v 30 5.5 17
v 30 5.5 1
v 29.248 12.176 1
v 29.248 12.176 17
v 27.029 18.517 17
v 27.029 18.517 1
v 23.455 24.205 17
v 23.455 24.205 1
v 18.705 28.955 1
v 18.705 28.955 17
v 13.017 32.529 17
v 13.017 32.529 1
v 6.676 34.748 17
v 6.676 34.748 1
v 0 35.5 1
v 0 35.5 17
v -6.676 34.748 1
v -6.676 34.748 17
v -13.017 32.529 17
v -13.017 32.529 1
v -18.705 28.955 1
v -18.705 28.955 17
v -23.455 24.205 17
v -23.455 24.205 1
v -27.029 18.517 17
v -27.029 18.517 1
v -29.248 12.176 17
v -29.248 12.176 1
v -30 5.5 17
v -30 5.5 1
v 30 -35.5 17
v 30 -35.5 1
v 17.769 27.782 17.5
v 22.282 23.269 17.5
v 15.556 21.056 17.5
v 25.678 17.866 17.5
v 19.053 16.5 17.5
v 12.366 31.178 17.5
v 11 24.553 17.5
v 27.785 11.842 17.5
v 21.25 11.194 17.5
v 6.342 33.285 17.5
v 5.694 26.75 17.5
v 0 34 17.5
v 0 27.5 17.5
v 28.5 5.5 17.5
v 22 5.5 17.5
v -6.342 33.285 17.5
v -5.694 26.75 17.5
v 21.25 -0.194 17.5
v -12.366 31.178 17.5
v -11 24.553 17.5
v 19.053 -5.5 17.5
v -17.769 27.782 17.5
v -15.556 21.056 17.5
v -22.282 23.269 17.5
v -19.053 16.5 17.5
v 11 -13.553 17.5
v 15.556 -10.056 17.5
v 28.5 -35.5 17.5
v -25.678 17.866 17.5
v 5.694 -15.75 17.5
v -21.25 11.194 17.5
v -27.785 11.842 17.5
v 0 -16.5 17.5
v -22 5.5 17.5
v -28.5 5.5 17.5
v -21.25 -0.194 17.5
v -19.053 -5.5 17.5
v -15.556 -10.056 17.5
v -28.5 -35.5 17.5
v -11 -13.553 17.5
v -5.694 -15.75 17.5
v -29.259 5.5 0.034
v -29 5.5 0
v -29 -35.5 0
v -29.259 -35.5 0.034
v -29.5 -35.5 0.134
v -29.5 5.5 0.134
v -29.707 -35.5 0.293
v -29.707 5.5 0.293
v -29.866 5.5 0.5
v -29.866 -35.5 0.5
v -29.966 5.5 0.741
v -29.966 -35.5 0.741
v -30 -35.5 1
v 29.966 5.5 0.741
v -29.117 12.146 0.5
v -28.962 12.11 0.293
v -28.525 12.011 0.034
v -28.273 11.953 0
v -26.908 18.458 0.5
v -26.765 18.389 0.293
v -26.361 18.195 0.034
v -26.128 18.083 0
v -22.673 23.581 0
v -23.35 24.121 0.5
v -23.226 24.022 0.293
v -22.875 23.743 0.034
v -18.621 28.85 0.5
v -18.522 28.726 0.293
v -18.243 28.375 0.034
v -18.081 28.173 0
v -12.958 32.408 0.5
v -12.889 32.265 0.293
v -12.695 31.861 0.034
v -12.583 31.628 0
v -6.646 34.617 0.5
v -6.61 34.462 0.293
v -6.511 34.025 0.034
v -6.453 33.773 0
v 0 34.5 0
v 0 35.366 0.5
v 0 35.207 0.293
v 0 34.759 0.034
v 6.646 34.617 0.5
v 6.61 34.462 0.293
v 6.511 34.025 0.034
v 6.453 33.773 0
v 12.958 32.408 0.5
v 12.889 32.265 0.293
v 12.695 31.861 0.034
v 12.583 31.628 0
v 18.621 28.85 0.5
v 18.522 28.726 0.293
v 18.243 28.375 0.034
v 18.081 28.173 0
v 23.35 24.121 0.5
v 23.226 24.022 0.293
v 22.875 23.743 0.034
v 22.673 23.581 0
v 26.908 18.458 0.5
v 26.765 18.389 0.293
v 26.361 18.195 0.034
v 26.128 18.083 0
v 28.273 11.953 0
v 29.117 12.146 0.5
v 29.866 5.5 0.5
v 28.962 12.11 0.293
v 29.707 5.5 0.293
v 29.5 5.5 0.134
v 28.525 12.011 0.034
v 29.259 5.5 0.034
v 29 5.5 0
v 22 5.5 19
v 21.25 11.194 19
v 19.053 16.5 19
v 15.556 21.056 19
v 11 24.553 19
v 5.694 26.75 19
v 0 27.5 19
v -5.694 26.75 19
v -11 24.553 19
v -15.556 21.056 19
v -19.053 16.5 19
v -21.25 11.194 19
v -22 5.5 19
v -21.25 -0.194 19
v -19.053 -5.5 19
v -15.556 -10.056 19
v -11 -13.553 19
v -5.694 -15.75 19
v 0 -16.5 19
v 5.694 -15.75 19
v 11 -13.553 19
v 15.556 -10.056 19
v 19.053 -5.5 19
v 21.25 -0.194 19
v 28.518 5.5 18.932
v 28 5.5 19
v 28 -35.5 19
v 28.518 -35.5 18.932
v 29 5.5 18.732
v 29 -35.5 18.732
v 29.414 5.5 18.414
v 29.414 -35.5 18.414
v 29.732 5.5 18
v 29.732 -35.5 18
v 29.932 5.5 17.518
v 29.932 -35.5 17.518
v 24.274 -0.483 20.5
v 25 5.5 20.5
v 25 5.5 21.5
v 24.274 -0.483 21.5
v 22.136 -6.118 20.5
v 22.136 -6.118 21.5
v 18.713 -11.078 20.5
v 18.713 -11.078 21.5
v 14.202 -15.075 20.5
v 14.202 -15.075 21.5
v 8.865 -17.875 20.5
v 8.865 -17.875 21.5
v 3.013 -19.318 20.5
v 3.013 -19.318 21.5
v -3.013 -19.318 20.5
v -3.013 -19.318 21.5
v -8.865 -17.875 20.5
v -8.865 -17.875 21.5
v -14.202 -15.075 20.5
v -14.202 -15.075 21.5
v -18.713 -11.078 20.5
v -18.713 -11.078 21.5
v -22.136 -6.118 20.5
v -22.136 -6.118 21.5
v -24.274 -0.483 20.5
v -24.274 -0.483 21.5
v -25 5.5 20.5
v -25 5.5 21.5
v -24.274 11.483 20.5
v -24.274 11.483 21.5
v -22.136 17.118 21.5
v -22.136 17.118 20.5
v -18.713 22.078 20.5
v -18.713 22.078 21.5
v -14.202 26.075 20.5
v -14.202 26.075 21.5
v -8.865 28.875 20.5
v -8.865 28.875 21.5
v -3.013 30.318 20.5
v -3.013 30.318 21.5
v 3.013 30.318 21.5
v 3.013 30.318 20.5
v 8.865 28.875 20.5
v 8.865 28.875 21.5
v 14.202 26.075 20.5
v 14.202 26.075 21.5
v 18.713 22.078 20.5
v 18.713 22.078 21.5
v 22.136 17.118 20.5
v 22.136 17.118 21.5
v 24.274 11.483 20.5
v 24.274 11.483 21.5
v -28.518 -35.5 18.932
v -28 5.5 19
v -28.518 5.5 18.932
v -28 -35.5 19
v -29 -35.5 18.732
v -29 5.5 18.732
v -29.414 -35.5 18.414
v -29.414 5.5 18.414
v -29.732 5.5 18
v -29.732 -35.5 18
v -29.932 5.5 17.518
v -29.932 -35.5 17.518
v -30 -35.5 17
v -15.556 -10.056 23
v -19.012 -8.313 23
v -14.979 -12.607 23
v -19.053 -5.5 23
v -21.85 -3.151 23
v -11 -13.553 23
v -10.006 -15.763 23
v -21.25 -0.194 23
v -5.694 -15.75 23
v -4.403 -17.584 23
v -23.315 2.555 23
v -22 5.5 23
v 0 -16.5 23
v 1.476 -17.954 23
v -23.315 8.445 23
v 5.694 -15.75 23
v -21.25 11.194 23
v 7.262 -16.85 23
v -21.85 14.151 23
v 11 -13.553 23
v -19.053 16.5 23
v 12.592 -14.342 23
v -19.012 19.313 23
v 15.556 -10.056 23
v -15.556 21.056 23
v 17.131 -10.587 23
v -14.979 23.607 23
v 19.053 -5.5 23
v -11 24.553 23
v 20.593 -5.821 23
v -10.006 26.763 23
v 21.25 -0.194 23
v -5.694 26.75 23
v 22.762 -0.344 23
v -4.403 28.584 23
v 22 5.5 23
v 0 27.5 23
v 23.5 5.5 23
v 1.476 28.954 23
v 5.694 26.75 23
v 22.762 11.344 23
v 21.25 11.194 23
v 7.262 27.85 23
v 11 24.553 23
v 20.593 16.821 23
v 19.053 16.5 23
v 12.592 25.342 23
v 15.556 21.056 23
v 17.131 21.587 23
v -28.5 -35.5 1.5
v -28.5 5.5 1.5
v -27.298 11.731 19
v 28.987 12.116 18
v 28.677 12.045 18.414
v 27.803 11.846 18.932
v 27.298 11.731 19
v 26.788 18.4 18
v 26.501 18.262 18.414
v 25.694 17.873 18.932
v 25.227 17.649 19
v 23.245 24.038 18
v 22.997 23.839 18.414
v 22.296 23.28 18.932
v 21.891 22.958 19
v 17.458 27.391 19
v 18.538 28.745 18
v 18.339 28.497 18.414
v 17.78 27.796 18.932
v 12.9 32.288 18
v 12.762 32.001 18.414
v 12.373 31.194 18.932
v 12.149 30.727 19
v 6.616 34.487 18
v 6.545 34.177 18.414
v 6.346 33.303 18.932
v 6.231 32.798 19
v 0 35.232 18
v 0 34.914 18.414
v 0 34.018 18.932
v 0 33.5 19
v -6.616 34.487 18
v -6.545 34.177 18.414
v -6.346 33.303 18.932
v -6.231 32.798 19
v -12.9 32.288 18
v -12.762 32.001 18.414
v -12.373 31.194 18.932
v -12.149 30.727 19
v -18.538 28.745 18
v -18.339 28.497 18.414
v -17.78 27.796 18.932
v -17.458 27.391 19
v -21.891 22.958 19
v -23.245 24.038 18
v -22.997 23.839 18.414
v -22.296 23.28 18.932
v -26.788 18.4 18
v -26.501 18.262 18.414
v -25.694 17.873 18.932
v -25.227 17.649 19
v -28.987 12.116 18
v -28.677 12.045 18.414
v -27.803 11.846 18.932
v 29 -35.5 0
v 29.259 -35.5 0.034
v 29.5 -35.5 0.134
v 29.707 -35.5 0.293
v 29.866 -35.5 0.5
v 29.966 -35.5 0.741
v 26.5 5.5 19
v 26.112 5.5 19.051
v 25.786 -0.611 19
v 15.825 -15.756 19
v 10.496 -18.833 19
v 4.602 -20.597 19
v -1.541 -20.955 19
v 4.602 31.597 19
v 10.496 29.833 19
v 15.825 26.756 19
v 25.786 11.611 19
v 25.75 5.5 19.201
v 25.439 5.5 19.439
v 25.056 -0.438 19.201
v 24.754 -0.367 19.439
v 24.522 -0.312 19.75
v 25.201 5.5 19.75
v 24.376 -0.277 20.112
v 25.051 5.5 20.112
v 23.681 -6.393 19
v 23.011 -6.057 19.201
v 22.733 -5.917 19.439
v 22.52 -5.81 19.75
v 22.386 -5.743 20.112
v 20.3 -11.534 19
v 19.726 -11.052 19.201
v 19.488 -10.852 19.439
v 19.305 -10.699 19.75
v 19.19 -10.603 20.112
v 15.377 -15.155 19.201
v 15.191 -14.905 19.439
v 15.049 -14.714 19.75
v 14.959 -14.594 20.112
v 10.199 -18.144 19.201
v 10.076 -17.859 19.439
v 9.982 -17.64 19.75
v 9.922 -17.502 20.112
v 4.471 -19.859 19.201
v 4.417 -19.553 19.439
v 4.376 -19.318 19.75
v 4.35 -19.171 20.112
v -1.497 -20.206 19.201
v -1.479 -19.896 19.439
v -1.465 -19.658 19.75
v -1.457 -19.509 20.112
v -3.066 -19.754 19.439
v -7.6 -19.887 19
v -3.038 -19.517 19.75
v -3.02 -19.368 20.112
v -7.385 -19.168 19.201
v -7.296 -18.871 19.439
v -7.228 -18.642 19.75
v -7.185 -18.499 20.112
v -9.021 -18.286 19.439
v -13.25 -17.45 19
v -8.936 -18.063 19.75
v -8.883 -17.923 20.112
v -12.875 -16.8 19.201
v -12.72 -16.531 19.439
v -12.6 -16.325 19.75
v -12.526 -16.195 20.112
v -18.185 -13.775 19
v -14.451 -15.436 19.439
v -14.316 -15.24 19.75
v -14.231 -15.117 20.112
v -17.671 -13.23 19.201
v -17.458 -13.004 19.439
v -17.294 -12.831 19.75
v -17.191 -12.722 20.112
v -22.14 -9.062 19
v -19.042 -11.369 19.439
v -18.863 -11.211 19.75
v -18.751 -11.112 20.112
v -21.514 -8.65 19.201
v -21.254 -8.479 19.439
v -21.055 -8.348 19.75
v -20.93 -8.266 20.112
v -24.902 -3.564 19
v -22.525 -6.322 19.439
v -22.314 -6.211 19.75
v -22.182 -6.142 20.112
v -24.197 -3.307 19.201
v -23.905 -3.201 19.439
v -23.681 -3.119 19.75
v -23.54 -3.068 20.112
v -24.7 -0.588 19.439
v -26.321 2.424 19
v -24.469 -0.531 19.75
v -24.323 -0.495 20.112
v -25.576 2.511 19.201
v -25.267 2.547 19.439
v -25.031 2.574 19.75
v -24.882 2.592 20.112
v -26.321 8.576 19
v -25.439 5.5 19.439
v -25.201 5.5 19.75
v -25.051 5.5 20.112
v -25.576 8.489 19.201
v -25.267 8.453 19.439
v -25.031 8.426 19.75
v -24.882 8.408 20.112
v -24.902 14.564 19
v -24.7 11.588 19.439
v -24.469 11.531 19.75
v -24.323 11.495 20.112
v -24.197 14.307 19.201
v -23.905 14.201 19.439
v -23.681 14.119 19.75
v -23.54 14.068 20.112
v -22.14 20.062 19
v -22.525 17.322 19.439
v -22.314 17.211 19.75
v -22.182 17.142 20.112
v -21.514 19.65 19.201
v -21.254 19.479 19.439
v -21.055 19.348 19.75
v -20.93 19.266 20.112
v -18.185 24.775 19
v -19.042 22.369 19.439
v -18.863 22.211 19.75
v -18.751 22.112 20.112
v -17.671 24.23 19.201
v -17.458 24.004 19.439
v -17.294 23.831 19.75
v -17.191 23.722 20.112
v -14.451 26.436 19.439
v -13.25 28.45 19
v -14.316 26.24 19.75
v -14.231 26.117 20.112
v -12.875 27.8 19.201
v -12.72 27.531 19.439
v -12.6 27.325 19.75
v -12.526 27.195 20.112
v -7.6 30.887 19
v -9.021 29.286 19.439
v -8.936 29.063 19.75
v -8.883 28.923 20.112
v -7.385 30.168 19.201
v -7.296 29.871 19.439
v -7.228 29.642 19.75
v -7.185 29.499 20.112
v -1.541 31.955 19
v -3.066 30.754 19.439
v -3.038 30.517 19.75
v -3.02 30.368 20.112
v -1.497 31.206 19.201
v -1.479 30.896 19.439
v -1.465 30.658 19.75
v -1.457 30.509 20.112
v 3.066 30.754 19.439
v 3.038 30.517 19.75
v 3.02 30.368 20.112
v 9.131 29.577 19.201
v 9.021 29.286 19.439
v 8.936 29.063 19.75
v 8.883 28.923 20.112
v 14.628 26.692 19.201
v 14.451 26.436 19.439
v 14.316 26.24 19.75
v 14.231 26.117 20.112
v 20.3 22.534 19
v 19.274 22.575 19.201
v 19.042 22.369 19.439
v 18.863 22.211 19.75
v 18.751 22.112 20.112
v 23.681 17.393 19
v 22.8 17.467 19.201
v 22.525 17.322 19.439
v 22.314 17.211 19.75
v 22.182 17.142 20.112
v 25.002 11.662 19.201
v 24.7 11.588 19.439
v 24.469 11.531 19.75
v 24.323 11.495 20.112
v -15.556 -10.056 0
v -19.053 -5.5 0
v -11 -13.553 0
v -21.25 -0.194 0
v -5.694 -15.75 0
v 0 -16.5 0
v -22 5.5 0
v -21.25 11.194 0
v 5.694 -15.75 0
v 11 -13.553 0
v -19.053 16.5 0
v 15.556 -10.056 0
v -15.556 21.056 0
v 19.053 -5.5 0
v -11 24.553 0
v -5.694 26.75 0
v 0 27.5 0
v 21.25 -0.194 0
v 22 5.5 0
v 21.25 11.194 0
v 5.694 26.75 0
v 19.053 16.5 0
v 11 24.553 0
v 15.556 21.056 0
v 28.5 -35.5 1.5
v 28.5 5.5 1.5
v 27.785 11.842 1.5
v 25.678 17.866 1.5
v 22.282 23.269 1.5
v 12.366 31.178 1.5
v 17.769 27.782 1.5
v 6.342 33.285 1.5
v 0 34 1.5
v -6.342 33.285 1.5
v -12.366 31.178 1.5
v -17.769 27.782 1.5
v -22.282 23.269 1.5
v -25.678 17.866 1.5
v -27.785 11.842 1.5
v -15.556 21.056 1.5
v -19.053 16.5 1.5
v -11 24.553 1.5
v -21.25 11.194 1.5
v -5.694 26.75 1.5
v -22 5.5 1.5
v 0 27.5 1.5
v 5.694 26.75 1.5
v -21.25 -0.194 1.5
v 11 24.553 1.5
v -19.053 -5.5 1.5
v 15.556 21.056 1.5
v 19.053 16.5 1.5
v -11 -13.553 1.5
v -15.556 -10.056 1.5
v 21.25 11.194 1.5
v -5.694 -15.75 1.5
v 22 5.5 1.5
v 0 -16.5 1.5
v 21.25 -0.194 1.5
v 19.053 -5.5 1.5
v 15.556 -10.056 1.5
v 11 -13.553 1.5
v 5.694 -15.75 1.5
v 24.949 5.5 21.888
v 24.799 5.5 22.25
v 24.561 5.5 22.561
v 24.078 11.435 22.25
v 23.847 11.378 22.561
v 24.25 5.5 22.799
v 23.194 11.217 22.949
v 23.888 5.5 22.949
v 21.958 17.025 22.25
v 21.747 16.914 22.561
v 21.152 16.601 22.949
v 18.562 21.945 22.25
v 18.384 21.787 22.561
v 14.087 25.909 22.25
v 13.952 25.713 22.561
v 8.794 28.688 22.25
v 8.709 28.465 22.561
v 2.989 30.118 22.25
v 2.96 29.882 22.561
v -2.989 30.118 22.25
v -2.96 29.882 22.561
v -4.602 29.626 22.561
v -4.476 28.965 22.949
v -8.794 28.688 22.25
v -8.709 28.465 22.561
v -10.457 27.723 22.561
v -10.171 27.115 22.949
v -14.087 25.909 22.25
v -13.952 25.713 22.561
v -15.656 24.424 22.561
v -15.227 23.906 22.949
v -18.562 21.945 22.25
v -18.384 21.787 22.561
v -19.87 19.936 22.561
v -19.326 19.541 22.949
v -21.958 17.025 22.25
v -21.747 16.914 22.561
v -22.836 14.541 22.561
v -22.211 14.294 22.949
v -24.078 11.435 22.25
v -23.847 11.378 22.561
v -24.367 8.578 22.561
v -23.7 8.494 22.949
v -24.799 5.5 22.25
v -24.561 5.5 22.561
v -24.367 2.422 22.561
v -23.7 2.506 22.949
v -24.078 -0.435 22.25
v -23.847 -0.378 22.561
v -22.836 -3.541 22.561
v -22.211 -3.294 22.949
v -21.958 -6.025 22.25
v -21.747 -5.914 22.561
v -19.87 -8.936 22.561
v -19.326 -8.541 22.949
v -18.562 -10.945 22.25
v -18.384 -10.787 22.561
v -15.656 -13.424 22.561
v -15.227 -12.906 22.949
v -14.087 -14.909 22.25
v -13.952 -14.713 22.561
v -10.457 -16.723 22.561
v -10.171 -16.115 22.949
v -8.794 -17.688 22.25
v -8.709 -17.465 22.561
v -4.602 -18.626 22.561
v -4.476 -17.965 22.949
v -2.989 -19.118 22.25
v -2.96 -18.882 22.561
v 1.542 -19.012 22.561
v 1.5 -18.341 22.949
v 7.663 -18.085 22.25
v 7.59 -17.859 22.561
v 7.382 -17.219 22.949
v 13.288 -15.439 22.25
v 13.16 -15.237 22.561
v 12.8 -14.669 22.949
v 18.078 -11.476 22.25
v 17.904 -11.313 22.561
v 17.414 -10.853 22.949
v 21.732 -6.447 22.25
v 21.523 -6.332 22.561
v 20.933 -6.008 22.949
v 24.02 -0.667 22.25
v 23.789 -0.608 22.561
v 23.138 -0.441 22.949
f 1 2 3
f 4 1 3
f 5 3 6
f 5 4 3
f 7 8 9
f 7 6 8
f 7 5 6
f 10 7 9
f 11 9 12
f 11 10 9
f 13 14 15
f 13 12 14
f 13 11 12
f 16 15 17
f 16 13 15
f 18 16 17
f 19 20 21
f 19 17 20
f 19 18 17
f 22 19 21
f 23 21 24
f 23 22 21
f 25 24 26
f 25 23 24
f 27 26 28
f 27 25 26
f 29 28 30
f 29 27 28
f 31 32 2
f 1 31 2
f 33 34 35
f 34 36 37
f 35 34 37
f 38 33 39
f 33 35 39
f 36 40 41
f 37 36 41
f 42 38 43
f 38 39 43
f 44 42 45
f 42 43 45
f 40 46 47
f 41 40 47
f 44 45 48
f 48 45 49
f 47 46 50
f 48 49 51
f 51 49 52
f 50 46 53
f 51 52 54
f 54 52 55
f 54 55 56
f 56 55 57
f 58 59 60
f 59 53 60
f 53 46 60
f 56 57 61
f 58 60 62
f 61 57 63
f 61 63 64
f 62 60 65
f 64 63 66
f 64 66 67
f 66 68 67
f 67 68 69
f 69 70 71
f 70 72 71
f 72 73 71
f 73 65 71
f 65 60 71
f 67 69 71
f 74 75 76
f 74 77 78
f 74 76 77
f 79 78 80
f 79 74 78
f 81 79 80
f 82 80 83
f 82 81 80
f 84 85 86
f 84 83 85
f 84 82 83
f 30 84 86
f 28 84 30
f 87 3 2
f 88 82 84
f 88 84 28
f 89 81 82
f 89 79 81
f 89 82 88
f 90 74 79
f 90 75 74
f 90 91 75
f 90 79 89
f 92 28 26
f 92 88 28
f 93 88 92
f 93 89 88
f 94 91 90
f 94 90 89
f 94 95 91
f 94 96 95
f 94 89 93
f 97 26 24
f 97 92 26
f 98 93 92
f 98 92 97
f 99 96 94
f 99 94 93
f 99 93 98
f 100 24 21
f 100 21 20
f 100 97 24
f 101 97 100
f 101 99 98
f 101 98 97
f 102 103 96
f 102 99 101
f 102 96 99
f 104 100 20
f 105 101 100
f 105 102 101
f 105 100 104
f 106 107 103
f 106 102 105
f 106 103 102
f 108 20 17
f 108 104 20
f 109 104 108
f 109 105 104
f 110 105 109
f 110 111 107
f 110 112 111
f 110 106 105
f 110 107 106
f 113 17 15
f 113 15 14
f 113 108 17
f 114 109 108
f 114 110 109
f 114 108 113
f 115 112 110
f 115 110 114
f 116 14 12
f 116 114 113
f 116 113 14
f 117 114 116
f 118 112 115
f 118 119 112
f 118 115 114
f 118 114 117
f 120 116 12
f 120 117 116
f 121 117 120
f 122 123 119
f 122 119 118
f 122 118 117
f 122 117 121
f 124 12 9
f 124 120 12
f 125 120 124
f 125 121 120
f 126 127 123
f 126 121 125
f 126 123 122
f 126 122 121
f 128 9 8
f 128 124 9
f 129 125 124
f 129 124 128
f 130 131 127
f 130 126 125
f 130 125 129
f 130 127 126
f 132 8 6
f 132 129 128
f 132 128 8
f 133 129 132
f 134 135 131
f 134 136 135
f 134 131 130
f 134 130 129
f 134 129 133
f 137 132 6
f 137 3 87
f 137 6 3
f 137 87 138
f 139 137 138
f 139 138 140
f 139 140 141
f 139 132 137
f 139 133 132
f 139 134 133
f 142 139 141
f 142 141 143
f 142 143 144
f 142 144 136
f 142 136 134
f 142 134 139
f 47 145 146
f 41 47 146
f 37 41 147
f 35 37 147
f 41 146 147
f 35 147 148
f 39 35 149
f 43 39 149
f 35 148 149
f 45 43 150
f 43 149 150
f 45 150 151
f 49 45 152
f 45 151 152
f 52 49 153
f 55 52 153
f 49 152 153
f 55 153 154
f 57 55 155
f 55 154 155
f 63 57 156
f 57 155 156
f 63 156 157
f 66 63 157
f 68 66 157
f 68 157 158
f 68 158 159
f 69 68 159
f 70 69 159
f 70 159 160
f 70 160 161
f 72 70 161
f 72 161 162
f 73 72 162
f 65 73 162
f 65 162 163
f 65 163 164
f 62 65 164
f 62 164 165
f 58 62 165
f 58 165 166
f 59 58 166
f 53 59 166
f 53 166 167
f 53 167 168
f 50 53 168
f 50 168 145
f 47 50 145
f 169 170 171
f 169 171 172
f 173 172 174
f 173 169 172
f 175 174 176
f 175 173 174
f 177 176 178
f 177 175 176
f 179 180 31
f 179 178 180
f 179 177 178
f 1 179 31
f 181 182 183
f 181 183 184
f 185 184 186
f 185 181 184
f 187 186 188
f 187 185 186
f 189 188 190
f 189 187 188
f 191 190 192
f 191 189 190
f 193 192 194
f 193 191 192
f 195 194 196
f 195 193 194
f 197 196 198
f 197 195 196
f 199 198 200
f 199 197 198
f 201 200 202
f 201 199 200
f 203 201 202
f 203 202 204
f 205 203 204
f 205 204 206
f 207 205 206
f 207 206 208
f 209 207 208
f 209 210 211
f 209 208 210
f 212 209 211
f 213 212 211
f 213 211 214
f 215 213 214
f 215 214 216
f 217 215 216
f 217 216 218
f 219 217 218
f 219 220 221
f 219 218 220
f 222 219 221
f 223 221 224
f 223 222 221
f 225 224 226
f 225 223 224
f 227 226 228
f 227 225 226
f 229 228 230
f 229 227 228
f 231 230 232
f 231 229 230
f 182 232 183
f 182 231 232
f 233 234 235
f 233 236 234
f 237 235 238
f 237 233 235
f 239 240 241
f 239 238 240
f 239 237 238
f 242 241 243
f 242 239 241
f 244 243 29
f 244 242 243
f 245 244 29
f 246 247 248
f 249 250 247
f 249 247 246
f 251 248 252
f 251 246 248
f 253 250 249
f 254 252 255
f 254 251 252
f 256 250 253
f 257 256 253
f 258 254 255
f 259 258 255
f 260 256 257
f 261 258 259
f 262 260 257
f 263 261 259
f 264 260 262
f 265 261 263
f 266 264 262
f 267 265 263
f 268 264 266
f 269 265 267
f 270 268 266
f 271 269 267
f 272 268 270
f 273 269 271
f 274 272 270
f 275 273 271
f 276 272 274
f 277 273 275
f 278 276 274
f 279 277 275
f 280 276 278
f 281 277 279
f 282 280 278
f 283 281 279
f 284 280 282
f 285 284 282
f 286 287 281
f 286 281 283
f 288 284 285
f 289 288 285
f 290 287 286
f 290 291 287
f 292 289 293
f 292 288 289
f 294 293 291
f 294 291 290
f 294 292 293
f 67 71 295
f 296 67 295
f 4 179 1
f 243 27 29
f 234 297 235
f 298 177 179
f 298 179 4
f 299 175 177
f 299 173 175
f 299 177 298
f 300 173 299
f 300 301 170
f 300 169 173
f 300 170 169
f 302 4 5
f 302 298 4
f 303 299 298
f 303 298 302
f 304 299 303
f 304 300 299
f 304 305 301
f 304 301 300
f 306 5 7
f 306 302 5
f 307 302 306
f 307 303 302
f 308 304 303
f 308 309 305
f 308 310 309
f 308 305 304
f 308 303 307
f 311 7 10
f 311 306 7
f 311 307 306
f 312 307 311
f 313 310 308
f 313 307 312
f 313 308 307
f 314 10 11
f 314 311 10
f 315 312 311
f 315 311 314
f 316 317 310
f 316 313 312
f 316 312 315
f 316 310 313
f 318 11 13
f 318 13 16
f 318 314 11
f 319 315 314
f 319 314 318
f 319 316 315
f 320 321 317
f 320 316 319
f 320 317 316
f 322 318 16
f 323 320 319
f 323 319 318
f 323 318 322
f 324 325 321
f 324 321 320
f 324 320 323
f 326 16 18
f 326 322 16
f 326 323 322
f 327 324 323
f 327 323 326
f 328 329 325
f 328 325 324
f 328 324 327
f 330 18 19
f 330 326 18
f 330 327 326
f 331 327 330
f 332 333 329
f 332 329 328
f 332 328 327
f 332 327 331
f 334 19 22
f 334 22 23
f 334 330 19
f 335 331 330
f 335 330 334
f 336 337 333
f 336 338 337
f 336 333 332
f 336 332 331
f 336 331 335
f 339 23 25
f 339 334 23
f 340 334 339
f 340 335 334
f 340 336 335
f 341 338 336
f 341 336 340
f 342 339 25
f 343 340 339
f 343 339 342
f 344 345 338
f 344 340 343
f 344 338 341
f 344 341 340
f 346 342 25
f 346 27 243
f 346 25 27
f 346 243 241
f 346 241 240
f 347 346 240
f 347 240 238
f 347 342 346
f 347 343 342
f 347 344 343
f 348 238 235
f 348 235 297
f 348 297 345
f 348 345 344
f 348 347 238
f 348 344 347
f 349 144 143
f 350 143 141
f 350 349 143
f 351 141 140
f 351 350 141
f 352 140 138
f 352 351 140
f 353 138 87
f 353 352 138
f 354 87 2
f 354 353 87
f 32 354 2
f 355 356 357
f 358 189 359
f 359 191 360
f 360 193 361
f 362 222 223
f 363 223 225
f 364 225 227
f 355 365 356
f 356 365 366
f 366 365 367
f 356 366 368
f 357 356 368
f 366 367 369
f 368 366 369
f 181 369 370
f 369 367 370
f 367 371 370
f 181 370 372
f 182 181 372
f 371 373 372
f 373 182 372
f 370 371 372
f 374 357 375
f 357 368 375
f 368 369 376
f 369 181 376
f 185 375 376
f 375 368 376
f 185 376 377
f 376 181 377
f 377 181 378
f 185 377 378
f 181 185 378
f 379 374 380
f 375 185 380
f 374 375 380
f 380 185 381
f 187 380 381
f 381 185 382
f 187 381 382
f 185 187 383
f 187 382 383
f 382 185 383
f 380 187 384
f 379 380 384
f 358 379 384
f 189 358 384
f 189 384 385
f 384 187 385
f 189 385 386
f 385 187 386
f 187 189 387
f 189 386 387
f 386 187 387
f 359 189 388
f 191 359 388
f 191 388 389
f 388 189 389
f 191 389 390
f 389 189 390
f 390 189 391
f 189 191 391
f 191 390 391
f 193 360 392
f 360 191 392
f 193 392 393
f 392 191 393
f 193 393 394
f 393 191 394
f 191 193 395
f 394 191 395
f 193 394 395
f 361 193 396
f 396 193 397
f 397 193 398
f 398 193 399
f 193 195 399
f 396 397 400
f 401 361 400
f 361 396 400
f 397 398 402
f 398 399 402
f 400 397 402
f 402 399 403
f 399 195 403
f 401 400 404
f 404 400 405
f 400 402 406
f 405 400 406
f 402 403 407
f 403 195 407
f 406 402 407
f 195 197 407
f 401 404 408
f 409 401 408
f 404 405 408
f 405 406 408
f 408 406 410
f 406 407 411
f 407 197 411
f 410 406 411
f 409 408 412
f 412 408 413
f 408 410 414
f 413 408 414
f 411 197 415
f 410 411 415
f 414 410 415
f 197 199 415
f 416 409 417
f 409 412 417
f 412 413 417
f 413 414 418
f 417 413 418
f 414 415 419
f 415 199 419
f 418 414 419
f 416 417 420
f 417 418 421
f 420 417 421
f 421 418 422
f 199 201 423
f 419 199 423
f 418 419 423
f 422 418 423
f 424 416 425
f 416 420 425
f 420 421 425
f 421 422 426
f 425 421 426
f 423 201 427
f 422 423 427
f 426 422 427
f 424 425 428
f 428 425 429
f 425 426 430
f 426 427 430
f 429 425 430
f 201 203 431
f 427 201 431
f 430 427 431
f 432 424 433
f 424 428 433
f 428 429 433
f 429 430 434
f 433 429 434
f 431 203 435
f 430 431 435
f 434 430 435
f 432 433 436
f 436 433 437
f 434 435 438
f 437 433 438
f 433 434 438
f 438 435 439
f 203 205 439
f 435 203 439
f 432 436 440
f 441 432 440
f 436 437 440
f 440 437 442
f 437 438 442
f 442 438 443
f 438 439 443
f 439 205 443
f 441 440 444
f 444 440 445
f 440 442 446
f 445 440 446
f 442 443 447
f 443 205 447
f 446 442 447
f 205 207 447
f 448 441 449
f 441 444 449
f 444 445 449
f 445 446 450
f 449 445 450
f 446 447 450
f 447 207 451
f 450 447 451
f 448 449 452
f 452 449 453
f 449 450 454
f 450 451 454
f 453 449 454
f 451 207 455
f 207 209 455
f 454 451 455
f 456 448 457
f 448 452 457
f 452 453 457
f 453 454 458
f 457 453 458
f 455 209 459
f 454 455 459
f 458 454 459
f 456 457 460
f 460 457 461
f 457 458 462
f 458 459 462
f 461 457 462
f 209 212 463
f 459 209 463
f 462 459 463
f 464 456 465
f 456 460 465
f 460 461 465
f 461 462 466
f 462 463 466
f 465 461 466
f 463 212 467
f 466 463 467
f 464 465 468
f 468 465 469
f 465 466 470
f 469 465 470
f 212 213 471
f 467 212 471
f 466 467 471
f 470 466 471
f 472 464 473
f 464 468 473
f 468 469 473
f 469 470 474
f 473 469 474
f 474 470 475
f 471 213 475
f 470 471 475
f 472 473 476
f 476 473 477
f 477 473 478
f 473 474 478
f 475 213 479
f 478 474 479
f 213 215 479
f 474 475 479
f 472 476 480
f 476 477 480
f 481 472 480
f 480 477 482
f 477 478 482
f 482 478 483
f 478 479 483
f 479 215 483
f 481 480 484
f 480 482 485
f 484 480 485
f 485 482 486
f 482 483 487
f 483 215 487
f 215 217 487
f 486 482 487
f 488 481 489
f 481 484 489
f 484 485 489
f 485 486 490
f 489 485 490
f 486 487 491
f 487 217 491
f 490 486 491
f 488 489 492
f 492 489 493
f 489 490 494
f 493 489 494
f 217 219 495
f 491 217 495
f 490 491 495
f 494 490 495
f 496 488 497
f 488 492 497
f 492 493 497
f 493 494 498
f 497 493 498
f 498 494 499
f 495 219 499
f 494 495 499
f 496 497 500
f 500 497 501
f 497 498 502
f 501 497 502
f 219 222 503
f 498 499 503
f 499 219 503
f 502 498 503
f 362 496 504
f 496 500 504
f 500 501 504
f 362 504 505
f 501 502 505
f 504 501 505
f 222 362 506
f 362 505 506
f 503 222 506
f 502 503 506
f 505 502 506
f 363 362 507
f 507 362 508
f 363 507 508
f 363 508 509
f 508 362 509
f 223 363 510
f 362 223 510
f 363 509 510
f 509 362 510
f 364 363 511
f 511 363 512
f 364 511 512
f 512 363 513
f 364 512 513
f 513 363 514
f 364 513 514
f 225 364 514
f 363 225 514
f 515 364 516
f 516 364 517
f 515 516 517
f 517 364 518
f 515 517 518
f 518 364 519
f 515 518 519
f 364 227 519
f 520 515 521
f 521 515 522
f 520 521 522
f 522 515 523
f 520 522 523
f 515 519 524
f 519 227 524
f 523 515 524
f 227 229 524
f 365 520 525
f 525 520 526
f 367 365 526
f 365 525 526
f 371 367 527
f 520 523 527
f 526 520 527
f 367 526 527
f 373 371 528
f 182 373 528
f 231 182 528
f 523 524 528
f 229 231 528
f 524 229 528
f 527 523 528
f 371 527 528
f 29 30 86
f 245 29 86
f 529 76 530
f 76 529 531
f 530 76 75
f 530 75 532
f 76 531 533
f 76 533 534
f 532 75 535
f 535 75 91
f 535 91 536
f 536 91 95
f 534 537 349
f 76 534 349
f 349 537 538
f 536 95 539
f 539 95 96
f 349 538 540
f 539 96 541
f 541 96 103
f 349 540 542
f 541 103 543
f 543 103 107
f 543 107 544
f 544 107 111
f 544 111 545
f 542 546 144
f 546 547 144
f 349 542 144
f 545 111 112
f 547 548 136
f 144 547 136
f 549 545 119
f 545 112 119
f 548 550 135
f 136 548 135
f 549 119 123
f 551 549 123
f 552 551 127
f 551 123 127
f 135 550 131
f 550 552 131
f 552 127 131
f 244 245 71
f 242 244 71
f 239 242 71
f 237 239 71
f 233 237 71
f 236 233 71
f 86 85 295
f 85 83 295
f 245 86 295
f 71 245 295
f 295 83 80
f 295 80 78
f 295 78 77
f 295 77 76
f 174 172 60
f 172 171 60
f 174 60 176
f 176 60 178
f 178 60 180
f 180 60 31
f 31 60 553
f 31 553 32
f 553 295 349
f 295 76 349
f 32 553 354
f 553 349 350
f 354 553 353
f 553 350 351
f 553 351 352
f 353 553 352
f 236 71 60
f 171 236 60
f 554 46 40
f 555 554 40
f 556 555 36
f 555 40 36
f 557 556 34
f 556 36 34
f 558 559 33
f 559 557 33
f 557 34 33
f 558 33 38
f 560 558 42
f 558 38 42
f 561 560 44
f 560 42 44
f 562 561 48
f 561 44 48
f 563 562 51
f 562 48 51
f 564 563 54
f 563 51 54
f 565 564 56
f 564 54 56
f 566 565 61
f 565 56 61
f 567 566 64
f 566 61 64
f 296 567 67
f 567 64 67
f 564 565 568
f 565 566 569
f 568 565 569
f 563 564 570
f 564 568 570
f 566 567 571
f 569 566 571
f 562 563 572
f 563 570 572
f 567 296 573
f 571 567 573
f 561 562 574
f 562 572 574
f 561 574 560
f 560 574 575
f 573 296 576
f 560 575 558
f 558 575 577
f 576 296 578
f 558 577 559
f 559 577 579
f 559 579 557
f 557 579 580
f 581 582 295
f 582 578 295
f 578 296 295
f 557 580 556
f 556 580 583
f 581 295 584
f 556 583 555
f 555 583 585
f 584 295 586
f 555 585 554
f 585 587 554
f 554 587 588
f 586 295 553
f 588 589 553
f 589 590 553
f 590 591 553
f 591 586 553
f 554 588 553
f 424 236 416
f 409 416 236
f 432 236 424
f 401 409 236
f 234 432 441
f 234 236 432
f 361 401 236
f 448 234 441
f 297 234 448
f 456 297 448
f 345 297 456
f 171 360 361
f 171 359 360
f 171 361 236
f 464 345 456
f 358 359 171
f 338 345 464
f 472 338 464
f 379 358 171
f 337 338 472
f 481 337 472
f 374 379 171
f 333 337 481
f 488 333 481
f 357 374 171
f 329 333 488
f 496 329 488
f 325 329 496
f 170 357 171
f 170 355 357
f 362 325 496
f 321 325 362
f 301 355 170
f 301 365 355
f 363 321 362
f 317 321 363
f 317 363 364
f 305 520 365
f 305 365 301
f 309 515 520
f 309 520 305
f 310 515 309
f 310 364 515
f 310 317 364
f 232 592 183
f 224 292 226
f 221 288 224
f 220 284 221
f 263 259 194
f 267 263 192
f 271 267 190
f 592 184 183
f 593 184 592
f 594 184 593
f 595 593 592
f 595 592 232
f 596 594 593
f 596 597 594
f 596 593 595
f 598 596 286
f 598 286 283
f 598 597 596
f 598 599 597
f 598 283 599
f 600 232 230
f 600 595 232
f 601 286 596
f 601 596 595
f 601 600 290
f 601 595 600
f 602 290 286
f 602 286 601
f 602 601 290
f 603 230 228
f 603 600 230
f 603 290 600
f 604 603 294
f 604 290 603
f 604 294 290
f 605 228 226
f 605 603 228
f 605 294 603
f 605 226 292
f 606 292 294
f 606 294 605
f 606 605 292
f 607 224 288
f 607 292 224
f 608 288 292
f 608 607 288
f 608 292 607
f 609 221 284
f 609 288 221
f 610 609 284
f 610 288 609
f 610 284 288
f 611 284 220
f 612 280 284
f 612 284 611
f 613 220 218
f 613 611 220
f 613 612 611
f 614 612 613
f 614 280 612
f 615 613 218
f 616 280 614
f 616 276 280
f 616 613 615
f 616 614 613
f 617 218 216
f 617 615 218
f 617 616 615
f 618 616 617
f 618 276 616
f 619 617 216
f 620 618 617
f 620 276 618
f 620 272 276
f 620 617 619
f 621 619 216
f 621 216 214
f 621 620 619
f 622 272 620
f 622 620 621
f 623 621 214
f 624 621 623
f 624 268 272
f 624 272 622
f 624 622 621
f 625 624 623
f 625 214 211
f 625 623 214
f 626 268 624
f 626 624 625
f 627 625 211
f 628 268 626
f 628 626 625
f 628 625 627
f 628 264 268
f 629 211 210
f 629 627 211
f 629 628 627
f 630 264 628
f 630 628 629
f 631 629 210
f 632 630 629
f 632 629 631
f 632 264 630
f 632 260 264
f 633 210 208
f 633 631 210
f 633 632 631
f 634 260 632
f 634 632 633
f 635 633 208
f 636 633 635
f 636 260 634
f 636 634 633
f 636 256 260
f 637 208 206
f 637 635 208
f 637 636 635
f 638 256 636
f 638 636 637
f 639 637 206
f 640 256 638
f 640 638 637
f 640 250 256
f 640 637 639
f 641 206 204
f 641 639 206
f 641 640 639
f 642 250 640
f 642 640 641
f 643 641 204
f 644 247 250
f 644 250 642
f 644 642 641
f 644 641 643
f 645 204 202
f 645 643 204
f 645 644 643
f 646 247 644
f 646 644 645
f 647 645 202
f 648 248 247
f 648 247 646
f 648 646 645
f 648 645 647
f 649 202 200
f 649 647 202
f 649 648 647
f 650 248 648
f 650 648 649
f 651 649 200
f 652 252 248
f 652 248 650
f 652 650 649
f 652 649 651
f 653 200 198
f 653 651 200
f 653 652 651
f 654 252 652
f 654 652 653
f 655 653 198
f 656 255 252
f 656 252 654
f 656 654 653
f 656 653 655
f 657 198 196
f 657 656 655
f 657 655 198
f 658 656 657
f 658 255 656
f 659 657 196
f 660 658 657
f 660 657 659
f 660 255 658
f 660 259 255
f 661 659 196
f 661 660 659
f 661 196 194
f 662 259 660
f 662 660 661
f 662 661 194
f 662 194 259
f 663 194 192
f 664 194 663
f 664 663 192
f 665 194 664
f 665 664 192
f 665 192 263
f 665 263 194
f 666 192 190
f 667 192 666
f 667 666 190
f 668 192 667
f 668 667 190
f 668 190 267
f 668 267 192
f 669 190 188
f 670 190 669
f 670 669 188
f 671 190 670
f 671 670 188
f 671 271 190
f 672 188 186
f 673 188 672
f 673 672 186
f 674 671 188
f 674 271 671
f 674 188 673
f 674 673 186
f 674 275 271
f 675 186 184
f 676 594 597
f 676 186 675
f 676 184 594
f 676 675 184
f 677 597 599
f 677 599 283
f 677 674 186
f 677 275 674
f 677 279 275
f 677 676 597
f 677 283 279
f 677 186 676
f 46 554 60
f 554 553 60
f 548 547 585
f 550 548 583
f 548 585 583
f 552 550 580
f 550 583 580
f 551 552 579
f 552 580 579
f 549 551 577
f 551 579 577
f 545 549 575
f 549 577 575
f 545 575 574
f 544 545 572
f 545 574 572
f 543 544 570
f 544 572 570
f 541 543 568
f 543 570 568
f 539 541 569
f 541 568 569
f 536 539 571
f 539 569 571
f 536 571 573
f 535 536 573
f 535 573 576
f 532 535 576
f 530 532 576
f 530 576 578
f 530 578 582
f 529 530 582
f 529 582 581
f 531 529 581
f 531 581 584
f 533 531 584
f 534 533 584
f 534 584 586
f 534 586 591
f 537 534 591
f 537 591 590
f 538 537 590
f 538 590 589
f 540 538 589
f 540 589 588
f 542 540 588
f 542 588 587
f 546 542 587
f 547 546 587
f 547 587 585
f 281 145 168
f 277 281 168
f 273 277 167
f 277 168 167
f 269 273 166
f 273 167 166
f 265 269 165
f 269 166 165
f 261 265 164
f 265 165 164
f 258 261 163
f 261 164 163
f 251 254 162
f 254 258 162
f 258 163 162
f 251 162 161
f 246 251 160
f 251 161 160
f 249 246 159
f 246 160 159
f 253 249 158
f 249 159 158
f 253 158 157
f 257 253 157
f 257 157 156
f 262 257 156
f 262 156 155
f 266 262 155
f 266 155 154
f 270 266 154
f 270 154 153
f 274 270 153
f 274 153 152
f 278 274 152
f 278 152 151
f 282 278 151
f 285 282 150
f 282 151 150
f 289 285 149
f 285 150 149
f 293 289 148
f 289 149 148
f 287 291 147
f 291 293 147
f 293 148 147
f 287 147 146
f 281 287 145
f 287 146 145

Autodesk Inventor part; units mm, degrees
ref_plane "YZ Plane" through (0, 0, 0) normal (1, 0, 0) x (0, 1, 0)
ref_plane "XZ Plane" through (0, 0, 0) normal (0, 1, 0) x (-1, 0, 0)
sketch "Эскиз1" plane through (0, 0, 0) normal (0, 0, 1) x (1, 0, 0)
  line L0 (-30, -35.5) -> (30, -35.5)
  line L1 (30, -35.5) -> (30, 35.5)
  line L2 (30, 35.5) -> (-30, 35.5)
  line L3 (-30, 35.5) -> (-30, -35.5)
  line L4 (-30, -35.5) -> (30, 35.5) construction
  line L5 (30, -35.5) -> (-30, 35.5) construction
  point P0 (0, 0)
  dimension "d0" = 60
  dimension "d1" = 71
extrude "Выдавливание1" add sketch "Эскиз1" along normal blind 19
sketch "Эскиз2" plane through (0, 0, 19) normal (0, 0, 1) x (1, 0, 0)
  circle A0 centre (0, 5.5) radius 22 construction
  circle A1 centre (0, 5.5) radius 30
  line L0 (30, 35.5) -> (-30, 35.5) projected
  line L1 (-30, 35.5) -> (-30, -35.5) projected
  line L2 (30, -35.5) -> (30, 35.5) projected
  point P0 (0, 0)
  point P1 (30, 5.5)
  point P2 (0, 35.5)
  point P3 (-30, 5.5)
  dimension "d4" = 44
  dimension "d5" = 60
  dimension "d6" = 8
extrude "Выдавливание2" cut sketch "Эскиз2" against normal through all contours A1 L0 L2 | A1 L1 L0
sketch "Эскиз3" plane through (0, 0, 19) normal (0, 0, 1) x (1, 0, 0)
  circle A0 centre (0, 5.5) radius 25
  arc A1 (30, 5.5) -> (-30, 5.5) centre (0, 5.5) ccw projected
  circle A2 centre (0, 5.5) radius 22
  point P0 (0, 0)
  dimension "d9" = 50
  dimension "d10" = 44
extrude "Выдавливание3" add sketch "Эскиз3" along normal blind 4
fillet "Сопряжение1" radius 1.5 2 edges at (-25, 5.5, 19) (-25, 5.5, 23)
sketch "Эскиз4" plane through (0, 5.5, 19) normal (0, 0, 1) x (1, 0, 0)
  circle A0 centre (0, 0) radius 22 projected
  point P0 (0, -5.5)
extrude "Выдавливание4" cut sketch "Эскиз4" against normal through all
sketch "Эскиз5" plane through (-30, -35.5, 0) normal (0, -1, 0) x (1, 0, 0)
  line L0 (1.5, 1.5) -> (58.5, 1.5)
  line L1 (58.5, 1.5) -> (58.5, 17.5)
  line L2 (58.5, 17.5) -> (1.5, 17.5)
  line L3 (1.5, 17.5) -> (1.5, 1.5)
  line L4 (60, 0) -> (60, 19) projected
  line L5 (0, 0) -> (60, 0) projected
  line L6 (0, 19) -> (60, 19) projected
  line L7 (0, 0) -> (0, 19) projected
  point P0 (30, 0)
  point P1 (30, 9.5)
  point P2 (30, 9.5)
  point P3 (60, 9.5)
  point P4 (30, 9.5)
  point P5 (30, 0)
  dimension "d16" = 1.5
  dimension "d17" = 1.5
  dimension "d18" = 1.5
  dimension "d19" = 1.5
ref_plane "РабПлоскость1" through (0, 5.5, 19) normal (0, -1, 0) x (0, 0, 1)
extrude "Выдавливание5" cut sketch "Эскиз5" against normal up to surface (41 mm away) contours L3 L2 L1 L0
sketch "Эскиз6" plane through (-28.5, 5.5, 17.5) normal (0, -1, 0) x (1, 0, 0)
  line L0 (6.5, 0) -> (6.5, -16) projected
  line L1 (0, 0) -> (6.5, 0) projected
  line L2 (0, -16) -> (0, 0) projected
  line L3 (6.5, -16) -> (0, -16) projected
  line L4 (28.5, -22.1) -> (28.5, 10.1) projected
  point P0 (28.5, -17.5)
revolve "Вращение1" cut sketch "Эскиз6" angle 180 about axis through (0, 5.5, 19) along (0, 0, -1)
fillet "Сопряжение2" radius 1 3 edges at (0, 35.5, 0) (30, -15, 0) (-30, -15, 0)
fillet "Сопряжение3" radius 2 3 edges at (0, 35.5, 19) (30, -15, 19) (-30, -15, 19)
equation "\"d17\" = d16"
equation "\"d18\" = d17"
equation "\"d19\" = d18"
properties part number "B6015L12F NF1" material "Стекло"
